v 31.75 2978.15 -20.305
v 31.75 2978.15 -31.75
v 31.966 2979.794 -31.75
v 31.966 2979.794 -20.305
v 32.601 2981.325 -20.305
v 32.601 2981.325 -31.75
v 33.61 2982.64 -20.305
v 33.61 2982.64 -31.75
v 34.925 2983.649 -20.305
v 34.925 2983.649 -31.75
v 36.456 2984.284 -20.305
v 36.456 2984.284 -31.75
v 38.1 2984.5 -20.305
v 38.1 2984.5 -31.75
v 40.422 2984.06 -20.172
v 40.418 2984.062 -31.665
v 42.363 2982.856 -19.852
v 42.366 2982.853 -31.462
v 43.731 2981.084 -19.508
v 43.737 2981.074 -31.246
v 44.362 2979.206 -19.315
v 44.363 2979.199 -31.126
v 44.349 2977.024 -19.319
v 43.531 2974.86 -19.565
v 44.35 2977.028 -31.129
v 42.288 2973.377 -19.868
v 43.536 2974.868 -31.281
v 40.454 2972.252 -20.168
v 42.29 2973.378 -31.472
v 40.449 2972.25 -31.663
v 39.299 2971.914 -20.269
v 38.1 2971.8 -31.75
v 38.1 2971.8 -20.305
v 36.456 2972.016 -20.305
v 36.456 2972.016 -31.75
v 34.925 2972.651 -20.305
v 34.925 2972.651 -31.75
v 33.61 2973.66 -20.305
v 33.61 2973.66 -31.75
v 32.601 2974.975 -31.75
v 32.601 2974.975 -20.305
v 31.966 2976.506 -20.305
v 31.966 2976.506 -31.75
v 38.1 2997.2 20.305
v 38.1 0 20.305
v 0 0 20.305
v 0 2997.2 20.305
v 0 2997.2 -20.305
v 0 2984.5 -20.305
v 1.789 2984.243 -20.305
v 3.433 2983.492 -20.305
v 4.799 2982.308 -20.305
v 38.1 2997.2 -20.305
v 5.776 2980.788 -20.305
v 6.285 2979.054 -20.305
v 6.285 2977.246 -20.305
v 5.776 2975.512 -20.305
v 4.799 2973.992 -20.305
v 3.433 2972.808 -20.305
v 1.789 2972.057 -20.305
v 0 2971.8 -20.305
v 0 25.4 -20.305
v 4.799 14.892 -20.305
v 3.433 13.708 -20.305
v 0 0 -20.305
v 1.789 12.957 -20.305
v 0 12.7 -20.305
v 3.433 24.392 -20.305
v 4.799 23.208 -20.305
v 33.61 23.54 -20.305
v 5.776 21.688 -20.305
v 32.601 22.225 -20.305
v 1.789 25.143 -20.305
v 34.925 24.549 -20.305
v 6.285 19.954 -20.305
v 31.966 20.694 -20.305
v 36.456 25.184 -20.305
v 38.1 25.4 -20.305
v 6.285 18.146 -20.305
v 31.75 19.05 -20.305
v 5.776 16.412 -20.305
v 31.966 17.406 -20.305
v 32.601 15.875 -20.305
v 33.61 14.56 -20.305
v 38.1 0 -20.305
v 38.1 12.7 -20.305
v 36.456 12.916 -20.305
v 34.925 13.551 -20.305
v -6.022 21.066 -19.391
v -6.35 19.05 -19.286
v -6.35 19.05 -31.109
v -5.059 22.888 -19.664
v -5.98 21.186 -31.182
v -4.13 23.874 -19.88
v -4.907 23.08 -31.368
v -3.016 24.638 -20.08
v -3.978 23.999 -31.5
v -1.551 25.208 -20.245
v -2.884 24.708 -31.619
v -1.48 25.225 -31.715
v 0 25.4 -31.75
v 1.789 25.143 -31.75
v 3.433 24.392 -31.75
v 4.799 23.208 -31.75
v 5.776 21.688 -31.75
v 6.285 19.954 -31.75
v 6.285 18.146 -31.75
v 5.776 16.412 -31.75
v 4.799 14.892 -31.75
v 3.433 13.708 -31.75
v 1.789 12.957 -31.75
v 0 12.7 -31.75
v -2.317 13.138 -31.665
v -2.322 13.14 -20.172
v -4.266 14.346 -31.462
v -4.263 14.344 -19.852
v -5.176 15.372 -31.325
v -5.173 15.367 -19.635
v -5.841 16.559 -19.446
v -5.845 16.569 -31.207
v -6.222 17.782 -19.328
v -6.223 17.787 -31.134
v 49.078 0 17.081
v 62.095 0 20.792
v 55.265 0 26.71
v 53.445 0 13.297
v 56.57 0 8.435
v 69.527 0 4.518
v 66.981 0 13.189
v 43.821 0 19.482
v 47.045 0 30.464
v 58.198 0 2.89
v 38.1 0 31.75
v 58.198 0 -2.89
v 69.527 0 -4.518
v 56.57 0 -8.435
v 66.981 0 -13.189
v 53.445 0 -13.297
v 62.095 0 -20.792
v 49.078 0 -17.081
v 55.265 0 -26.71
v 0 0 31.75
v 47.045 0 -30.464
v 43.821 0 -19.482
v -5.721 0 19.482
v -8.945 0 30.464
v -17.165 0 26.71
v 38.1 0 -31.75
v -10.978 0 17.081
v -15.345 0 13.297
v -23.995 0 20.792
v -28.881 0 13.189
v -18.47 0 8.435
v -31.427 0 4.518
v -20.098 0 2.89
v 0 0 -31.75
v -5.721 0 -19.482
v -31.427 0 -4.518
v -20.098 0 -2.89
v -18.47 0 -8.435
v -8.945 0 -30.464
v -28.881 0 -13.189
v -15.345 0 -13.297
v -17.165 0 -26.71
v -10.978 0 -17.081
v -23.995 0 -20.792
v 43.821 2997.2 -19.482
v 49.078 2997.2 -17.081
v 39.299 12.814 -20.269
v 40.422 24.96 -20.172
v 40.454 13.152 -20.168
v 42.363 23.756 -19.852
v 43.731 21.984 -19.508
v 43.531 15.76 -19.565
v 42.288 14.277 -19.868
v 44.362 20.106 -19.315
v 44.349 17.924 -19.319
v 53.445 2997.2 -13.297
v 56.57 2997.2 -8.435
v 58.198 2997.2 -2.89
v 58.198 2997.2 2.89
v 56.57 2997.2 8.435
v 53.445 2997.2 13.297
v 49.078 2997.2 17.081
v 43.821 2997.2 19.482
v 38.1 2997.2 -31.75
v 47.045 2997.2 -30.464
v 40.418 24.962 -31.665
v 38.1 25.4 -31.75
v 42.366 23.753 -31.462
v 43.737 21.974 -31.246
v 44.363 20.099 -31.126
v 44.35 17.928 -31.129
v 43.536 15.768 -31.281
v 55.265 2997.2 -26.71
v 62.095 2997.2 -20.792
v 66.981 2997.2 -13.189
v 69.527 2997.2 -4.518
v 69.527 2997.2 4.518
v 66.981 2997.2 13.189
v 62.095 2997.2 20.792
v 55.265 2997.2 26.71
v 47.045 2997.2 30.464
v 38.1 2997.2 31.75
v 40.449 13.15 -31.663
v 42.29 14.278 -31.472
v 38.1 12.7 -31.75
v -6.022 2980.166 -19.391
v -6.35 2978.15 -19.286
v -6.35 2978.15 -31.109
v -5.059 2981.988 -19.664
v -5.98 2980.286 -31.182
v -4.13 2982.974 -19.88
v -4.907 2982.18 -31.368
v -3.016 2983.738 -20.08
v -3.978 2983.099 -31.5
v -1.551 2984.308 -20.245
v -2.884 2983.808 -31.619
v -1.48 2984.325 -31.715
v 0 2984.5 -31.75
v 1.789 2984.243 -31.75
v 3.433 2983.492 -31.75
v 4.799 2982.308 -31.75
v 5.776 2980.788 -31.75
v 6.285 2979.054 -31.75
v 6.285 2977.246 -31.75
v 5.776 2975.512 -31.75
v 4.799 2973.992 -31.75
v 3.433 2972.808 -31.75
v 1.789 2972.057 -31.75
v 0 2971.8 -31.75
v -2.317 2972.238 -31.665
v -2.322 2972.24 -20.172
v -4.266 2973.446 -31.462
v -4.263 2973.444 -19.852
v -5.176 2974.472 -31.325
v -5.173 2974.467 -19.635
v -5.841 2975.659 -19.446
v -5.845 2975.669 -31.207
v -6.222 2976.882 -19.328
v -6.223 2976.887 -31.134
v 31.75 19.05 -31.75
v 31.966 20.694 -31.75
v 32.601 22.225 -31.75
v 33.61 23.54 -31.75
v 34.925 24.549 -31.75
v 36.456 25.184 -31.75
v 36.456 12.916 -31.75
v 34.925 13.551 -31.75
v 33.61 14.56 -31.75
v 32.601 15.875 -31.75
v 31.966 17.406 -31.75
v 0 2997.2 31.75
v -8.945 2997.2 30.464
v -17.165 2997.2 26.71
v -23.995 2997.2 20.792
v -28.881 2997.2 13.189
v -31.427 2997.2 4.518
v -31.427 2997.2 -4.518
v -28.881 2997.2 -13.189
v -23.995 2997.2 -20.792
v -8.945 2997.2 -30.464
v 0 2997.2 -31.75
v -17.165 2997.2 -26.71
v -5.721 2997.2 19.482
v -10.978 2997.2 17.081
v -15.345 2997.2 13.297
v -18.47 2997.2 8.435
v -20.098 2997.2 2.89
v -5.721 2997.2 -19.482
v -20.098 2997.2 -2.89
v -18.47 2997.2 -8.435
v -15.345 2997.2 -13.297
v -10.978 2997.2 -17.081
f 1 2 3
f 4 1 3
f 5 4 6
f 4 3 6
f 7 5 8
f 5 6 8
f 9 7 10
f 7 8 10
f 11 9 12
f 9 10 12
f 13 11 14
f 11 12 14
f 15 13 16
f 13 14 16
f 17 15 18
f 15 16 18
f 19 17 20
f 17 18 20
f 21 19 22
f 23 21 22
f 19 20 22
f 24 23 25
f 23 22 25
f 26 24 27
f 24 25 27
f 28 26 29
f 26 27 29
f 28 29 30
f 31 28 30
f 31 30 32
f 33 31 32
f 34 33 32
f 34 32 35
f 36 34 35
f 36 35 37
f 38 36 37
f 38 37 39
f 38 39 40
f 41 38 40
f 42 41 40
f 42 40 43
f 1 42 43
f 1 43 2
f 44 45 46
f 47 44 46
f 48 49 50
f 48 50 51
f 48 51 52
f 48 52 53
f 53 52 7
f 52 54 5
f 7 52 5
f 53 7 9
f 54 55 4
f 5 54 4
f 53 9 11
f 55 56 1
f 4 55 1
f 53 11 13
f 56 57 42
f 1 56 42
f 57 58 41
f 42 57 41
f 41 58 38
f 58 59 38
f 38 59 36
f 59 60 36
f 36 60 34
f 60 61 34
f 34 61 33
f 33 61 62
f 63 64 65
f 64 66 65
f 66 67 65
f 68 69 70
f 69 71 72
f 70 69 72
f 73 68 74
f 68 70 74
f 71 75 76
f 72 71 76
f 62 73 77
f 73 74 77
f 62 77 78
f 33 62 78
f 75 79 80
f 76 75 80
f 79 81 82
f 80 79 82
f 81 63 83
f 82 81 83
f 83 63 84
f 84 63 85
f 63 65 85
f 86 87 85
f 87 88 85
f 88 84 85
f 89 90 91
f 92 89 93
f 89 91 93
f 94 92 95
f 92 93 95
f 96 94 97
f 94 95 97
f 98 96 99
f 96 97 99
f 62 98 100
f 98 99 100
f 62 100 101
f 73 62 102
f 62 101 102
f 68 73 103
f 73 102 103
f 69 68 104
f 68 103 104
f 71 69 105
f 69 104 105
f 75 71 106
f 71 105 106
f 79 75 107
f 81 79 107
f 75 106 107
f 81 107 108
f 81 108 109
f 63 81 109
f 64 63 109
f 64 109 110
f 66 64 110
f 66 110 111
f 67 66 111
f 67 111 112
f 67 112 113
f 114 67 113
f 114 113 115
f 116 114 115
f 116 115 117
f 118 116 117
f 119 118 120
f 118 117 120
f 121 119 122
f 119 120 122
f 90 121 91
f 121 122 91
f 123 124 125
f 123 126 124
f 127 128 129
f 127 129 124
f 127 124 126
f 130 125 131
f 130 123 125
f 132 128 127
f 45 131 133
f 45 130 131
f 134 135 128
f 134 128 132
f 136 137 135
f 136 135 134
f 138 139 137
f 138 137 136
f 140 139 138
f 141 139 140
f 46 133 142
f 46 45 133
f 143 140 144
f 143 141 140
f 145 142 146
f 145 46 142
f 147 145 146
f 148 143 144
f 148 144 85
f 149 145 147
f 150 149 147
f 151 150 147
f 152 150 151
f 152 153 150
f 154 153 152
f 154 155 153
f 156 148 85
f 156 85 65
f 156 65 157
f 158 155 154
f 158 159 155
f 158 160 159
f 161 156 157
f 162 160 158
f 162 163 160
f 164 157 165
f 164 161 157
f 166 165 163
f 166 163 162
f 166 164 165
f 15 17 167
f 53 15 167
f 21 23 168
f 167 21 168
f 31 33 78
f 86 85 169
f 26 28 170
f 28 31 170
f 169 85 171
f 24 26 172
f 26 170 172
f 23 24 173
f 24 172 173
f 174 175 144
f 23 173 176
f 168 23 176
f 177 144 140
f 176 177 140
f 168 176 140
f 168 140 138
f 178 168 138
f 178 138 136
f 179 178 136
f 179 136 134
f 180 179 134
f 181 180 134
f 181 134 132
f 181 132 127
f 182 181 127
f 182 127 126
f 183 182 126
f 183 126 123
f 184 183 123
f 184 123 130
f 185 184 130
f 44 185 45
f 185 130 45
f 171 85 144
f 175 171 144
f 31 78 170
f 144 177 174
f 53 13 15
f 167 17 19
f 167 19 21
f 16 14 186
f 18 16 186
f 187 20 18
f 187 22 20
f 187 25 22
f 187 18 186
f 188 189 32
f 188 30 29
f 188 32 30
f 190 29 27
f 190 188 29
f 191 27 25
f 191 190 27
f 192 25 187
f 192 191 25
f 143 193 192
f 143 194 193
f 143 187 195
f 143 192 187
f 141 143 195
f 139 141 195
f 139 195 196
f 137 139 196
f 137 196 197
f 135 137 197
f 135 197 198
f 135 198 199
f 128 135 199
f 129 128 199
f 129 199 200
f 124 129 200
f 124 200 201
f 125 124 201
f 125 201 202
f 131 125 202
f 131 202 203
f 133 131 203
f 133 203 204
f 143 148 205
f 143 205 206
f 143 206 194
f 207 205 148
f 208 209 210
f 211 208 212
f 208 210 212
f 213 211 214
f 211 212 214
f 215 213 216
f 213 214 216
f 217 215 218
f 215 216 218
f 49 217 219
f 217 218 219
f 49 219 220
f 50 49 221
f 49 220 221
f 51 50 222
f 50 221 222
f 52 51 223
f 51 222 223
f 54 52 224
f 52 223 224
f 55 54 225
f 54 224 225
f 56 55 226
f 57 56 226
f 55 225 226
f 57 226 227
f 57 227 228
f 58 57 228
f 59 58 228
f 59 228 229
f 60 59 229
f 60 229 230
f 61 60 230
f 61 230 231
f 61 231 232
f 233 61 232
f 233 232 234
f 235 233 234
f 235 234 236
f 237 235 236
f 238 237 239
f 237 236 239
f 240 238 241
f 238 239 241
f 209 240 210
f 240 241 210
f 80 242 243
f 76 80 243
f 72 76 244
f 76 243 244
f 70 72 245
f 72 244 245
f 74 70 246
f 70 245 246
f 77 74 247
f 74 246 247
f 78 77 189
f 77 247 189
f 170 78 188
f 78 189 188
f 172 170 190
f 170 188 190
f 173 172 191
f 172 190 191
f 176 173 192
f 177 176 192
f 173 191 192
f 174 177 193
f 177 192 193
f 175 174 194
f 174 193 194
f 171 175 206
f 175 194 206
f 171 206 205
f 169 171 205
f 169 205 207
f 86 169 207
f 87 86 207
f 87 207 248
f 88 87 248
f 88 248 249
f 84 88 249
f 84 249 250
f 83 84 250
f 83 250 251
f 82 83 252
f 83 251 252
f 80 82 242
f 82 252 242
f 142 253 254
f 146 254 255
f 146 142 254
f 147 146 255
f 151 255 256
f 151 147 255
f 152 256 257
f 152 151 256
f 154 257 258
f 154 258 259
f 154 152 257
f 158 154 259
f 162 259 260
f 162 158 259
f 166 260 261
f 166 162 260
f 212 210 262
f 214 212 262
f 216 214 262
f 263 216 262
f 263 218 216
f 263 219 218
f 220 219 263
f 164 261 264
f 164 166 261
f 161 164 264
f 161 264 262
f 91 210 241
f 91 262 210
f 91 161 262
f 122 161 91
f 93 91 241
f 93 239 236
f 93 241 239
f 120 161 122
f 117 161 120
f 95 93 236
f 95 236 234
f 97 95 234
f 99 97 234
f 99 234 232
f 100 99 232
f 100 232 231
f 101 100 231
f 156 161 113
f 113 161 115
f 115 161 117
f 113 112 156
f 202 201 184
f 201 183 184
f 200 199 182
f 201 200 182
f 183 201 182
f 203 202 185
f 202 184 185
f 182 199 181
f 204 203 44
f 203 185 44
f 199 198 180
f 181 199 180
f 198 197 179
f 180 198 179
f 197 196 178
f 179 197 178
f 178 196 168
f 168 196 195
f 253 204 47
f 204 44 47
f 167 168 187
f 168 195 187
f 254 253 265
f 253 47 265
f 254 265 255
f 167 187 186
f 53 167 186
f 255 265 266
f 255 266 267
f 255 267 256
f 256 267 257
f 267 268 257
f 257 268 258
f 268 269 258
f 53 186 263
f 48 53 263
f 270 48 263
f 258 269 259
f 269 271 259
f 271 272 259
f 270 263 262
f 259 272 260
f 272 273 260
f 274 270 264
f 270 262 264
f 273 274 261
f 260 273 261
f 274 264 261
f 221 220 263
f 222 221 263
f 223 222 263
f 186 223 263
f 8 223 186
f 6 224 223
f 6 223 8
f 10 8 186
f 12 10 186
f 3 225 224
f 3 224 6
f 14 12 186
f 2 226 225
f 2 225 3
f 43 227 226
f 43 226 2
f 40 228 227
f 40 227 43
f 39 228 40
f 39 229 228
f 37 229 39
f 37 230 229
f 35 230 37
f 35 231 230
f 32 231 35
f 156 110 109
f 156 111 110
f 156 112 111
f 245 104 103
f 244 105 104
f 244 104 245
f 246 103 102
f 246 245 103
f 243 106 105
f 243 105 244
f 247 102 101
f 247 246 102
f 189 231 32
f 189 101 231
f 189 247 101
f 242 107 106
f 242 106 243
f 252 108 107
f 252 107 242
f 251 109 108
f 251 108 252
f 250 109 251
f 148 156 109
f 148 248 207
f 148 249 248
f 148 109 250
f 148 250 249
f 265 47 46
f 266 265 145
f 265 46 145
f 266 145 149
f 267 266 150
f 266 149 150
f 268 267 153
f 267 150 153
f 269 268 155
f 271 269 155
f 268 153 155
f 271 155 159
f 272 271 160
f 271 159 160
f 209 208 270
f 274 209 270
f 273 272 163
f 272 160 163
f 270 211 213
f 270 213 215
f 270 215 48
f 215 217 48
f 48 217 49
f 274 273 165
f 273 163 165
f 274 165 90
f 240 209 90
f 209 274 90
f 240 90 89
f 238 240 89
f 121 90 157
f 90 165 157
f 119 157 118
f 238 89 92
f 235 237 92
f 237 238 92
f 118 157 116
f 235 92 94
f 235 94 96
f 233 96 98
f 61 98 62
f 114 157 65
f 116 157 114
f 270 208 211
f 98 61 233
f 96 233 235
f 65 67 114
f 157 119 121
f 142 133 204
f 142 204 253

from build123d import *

# Parameters (mm, degrees)
BOSS_EXTRUDE1_DEPTH = 2997.2
SKETCH2_R           = 6.35
CUT_EXTRUDE1_DEPTH  = 25.4


with BuildPart() as part:
    # Sketch1 → Boss-Extrude1 (new body)
    with BuildSketch(Plane(origin=(0, 0, 0), x_dir=(1, 0, 0), z_dir=(0, 1, 0))):
        with BuildLine():
            Line((0, 31.75), (38.1, 31.75))
            ThreePointArc((38.1, 31.75), (69.85, 0), (38.1, -31.75))
            Line((38.1, -31.75), (0, -31.75))
            ThreePointArc((0, -31.75), (-31.75, 0), (0, 31.75))
        make_face()
        with BuildLine():
            Line((0, 20.304779167), (38.1, 20.304779167))
            ThreePointArc((38.1, 20.304779167), (58.404779167, 0), (38.1, -20.304779167))
            Line((38.1, -20.304779167), (0, -20.304779167))
            ThreePointArc((0, -20.304779167), (-20.304779167, 0), (0, 20.304779167))
        make_face(mode=Mode.SUBTRACT)
    extrude(amount=BOSS_EXTRUDE1_DEPTH)

    # Sketch2 → Cut-Extrude1 (cut)
    with BuildSketch(Plane(origin=(0, 0, -31.75), x_dir=(-1, 0, 0), z_dir=(0, 0, -1))):
        with Locations((-38.1, 19.05)):
            Circle(SKETCH2_R)
        with Locations((0, 19.05)):
            Circle(SKETCH2_R)
        with Locations((-38.1, 2978.15)):
            Circle(SKETCH2_R)
        with Locations((0, 2978.15)):
            Circle(SKETCH2_R)
    extrude(amount=-CUT_EXTRUDE1_DEPTH, mode=Mode.SUBTRACT)


solid = part.part
